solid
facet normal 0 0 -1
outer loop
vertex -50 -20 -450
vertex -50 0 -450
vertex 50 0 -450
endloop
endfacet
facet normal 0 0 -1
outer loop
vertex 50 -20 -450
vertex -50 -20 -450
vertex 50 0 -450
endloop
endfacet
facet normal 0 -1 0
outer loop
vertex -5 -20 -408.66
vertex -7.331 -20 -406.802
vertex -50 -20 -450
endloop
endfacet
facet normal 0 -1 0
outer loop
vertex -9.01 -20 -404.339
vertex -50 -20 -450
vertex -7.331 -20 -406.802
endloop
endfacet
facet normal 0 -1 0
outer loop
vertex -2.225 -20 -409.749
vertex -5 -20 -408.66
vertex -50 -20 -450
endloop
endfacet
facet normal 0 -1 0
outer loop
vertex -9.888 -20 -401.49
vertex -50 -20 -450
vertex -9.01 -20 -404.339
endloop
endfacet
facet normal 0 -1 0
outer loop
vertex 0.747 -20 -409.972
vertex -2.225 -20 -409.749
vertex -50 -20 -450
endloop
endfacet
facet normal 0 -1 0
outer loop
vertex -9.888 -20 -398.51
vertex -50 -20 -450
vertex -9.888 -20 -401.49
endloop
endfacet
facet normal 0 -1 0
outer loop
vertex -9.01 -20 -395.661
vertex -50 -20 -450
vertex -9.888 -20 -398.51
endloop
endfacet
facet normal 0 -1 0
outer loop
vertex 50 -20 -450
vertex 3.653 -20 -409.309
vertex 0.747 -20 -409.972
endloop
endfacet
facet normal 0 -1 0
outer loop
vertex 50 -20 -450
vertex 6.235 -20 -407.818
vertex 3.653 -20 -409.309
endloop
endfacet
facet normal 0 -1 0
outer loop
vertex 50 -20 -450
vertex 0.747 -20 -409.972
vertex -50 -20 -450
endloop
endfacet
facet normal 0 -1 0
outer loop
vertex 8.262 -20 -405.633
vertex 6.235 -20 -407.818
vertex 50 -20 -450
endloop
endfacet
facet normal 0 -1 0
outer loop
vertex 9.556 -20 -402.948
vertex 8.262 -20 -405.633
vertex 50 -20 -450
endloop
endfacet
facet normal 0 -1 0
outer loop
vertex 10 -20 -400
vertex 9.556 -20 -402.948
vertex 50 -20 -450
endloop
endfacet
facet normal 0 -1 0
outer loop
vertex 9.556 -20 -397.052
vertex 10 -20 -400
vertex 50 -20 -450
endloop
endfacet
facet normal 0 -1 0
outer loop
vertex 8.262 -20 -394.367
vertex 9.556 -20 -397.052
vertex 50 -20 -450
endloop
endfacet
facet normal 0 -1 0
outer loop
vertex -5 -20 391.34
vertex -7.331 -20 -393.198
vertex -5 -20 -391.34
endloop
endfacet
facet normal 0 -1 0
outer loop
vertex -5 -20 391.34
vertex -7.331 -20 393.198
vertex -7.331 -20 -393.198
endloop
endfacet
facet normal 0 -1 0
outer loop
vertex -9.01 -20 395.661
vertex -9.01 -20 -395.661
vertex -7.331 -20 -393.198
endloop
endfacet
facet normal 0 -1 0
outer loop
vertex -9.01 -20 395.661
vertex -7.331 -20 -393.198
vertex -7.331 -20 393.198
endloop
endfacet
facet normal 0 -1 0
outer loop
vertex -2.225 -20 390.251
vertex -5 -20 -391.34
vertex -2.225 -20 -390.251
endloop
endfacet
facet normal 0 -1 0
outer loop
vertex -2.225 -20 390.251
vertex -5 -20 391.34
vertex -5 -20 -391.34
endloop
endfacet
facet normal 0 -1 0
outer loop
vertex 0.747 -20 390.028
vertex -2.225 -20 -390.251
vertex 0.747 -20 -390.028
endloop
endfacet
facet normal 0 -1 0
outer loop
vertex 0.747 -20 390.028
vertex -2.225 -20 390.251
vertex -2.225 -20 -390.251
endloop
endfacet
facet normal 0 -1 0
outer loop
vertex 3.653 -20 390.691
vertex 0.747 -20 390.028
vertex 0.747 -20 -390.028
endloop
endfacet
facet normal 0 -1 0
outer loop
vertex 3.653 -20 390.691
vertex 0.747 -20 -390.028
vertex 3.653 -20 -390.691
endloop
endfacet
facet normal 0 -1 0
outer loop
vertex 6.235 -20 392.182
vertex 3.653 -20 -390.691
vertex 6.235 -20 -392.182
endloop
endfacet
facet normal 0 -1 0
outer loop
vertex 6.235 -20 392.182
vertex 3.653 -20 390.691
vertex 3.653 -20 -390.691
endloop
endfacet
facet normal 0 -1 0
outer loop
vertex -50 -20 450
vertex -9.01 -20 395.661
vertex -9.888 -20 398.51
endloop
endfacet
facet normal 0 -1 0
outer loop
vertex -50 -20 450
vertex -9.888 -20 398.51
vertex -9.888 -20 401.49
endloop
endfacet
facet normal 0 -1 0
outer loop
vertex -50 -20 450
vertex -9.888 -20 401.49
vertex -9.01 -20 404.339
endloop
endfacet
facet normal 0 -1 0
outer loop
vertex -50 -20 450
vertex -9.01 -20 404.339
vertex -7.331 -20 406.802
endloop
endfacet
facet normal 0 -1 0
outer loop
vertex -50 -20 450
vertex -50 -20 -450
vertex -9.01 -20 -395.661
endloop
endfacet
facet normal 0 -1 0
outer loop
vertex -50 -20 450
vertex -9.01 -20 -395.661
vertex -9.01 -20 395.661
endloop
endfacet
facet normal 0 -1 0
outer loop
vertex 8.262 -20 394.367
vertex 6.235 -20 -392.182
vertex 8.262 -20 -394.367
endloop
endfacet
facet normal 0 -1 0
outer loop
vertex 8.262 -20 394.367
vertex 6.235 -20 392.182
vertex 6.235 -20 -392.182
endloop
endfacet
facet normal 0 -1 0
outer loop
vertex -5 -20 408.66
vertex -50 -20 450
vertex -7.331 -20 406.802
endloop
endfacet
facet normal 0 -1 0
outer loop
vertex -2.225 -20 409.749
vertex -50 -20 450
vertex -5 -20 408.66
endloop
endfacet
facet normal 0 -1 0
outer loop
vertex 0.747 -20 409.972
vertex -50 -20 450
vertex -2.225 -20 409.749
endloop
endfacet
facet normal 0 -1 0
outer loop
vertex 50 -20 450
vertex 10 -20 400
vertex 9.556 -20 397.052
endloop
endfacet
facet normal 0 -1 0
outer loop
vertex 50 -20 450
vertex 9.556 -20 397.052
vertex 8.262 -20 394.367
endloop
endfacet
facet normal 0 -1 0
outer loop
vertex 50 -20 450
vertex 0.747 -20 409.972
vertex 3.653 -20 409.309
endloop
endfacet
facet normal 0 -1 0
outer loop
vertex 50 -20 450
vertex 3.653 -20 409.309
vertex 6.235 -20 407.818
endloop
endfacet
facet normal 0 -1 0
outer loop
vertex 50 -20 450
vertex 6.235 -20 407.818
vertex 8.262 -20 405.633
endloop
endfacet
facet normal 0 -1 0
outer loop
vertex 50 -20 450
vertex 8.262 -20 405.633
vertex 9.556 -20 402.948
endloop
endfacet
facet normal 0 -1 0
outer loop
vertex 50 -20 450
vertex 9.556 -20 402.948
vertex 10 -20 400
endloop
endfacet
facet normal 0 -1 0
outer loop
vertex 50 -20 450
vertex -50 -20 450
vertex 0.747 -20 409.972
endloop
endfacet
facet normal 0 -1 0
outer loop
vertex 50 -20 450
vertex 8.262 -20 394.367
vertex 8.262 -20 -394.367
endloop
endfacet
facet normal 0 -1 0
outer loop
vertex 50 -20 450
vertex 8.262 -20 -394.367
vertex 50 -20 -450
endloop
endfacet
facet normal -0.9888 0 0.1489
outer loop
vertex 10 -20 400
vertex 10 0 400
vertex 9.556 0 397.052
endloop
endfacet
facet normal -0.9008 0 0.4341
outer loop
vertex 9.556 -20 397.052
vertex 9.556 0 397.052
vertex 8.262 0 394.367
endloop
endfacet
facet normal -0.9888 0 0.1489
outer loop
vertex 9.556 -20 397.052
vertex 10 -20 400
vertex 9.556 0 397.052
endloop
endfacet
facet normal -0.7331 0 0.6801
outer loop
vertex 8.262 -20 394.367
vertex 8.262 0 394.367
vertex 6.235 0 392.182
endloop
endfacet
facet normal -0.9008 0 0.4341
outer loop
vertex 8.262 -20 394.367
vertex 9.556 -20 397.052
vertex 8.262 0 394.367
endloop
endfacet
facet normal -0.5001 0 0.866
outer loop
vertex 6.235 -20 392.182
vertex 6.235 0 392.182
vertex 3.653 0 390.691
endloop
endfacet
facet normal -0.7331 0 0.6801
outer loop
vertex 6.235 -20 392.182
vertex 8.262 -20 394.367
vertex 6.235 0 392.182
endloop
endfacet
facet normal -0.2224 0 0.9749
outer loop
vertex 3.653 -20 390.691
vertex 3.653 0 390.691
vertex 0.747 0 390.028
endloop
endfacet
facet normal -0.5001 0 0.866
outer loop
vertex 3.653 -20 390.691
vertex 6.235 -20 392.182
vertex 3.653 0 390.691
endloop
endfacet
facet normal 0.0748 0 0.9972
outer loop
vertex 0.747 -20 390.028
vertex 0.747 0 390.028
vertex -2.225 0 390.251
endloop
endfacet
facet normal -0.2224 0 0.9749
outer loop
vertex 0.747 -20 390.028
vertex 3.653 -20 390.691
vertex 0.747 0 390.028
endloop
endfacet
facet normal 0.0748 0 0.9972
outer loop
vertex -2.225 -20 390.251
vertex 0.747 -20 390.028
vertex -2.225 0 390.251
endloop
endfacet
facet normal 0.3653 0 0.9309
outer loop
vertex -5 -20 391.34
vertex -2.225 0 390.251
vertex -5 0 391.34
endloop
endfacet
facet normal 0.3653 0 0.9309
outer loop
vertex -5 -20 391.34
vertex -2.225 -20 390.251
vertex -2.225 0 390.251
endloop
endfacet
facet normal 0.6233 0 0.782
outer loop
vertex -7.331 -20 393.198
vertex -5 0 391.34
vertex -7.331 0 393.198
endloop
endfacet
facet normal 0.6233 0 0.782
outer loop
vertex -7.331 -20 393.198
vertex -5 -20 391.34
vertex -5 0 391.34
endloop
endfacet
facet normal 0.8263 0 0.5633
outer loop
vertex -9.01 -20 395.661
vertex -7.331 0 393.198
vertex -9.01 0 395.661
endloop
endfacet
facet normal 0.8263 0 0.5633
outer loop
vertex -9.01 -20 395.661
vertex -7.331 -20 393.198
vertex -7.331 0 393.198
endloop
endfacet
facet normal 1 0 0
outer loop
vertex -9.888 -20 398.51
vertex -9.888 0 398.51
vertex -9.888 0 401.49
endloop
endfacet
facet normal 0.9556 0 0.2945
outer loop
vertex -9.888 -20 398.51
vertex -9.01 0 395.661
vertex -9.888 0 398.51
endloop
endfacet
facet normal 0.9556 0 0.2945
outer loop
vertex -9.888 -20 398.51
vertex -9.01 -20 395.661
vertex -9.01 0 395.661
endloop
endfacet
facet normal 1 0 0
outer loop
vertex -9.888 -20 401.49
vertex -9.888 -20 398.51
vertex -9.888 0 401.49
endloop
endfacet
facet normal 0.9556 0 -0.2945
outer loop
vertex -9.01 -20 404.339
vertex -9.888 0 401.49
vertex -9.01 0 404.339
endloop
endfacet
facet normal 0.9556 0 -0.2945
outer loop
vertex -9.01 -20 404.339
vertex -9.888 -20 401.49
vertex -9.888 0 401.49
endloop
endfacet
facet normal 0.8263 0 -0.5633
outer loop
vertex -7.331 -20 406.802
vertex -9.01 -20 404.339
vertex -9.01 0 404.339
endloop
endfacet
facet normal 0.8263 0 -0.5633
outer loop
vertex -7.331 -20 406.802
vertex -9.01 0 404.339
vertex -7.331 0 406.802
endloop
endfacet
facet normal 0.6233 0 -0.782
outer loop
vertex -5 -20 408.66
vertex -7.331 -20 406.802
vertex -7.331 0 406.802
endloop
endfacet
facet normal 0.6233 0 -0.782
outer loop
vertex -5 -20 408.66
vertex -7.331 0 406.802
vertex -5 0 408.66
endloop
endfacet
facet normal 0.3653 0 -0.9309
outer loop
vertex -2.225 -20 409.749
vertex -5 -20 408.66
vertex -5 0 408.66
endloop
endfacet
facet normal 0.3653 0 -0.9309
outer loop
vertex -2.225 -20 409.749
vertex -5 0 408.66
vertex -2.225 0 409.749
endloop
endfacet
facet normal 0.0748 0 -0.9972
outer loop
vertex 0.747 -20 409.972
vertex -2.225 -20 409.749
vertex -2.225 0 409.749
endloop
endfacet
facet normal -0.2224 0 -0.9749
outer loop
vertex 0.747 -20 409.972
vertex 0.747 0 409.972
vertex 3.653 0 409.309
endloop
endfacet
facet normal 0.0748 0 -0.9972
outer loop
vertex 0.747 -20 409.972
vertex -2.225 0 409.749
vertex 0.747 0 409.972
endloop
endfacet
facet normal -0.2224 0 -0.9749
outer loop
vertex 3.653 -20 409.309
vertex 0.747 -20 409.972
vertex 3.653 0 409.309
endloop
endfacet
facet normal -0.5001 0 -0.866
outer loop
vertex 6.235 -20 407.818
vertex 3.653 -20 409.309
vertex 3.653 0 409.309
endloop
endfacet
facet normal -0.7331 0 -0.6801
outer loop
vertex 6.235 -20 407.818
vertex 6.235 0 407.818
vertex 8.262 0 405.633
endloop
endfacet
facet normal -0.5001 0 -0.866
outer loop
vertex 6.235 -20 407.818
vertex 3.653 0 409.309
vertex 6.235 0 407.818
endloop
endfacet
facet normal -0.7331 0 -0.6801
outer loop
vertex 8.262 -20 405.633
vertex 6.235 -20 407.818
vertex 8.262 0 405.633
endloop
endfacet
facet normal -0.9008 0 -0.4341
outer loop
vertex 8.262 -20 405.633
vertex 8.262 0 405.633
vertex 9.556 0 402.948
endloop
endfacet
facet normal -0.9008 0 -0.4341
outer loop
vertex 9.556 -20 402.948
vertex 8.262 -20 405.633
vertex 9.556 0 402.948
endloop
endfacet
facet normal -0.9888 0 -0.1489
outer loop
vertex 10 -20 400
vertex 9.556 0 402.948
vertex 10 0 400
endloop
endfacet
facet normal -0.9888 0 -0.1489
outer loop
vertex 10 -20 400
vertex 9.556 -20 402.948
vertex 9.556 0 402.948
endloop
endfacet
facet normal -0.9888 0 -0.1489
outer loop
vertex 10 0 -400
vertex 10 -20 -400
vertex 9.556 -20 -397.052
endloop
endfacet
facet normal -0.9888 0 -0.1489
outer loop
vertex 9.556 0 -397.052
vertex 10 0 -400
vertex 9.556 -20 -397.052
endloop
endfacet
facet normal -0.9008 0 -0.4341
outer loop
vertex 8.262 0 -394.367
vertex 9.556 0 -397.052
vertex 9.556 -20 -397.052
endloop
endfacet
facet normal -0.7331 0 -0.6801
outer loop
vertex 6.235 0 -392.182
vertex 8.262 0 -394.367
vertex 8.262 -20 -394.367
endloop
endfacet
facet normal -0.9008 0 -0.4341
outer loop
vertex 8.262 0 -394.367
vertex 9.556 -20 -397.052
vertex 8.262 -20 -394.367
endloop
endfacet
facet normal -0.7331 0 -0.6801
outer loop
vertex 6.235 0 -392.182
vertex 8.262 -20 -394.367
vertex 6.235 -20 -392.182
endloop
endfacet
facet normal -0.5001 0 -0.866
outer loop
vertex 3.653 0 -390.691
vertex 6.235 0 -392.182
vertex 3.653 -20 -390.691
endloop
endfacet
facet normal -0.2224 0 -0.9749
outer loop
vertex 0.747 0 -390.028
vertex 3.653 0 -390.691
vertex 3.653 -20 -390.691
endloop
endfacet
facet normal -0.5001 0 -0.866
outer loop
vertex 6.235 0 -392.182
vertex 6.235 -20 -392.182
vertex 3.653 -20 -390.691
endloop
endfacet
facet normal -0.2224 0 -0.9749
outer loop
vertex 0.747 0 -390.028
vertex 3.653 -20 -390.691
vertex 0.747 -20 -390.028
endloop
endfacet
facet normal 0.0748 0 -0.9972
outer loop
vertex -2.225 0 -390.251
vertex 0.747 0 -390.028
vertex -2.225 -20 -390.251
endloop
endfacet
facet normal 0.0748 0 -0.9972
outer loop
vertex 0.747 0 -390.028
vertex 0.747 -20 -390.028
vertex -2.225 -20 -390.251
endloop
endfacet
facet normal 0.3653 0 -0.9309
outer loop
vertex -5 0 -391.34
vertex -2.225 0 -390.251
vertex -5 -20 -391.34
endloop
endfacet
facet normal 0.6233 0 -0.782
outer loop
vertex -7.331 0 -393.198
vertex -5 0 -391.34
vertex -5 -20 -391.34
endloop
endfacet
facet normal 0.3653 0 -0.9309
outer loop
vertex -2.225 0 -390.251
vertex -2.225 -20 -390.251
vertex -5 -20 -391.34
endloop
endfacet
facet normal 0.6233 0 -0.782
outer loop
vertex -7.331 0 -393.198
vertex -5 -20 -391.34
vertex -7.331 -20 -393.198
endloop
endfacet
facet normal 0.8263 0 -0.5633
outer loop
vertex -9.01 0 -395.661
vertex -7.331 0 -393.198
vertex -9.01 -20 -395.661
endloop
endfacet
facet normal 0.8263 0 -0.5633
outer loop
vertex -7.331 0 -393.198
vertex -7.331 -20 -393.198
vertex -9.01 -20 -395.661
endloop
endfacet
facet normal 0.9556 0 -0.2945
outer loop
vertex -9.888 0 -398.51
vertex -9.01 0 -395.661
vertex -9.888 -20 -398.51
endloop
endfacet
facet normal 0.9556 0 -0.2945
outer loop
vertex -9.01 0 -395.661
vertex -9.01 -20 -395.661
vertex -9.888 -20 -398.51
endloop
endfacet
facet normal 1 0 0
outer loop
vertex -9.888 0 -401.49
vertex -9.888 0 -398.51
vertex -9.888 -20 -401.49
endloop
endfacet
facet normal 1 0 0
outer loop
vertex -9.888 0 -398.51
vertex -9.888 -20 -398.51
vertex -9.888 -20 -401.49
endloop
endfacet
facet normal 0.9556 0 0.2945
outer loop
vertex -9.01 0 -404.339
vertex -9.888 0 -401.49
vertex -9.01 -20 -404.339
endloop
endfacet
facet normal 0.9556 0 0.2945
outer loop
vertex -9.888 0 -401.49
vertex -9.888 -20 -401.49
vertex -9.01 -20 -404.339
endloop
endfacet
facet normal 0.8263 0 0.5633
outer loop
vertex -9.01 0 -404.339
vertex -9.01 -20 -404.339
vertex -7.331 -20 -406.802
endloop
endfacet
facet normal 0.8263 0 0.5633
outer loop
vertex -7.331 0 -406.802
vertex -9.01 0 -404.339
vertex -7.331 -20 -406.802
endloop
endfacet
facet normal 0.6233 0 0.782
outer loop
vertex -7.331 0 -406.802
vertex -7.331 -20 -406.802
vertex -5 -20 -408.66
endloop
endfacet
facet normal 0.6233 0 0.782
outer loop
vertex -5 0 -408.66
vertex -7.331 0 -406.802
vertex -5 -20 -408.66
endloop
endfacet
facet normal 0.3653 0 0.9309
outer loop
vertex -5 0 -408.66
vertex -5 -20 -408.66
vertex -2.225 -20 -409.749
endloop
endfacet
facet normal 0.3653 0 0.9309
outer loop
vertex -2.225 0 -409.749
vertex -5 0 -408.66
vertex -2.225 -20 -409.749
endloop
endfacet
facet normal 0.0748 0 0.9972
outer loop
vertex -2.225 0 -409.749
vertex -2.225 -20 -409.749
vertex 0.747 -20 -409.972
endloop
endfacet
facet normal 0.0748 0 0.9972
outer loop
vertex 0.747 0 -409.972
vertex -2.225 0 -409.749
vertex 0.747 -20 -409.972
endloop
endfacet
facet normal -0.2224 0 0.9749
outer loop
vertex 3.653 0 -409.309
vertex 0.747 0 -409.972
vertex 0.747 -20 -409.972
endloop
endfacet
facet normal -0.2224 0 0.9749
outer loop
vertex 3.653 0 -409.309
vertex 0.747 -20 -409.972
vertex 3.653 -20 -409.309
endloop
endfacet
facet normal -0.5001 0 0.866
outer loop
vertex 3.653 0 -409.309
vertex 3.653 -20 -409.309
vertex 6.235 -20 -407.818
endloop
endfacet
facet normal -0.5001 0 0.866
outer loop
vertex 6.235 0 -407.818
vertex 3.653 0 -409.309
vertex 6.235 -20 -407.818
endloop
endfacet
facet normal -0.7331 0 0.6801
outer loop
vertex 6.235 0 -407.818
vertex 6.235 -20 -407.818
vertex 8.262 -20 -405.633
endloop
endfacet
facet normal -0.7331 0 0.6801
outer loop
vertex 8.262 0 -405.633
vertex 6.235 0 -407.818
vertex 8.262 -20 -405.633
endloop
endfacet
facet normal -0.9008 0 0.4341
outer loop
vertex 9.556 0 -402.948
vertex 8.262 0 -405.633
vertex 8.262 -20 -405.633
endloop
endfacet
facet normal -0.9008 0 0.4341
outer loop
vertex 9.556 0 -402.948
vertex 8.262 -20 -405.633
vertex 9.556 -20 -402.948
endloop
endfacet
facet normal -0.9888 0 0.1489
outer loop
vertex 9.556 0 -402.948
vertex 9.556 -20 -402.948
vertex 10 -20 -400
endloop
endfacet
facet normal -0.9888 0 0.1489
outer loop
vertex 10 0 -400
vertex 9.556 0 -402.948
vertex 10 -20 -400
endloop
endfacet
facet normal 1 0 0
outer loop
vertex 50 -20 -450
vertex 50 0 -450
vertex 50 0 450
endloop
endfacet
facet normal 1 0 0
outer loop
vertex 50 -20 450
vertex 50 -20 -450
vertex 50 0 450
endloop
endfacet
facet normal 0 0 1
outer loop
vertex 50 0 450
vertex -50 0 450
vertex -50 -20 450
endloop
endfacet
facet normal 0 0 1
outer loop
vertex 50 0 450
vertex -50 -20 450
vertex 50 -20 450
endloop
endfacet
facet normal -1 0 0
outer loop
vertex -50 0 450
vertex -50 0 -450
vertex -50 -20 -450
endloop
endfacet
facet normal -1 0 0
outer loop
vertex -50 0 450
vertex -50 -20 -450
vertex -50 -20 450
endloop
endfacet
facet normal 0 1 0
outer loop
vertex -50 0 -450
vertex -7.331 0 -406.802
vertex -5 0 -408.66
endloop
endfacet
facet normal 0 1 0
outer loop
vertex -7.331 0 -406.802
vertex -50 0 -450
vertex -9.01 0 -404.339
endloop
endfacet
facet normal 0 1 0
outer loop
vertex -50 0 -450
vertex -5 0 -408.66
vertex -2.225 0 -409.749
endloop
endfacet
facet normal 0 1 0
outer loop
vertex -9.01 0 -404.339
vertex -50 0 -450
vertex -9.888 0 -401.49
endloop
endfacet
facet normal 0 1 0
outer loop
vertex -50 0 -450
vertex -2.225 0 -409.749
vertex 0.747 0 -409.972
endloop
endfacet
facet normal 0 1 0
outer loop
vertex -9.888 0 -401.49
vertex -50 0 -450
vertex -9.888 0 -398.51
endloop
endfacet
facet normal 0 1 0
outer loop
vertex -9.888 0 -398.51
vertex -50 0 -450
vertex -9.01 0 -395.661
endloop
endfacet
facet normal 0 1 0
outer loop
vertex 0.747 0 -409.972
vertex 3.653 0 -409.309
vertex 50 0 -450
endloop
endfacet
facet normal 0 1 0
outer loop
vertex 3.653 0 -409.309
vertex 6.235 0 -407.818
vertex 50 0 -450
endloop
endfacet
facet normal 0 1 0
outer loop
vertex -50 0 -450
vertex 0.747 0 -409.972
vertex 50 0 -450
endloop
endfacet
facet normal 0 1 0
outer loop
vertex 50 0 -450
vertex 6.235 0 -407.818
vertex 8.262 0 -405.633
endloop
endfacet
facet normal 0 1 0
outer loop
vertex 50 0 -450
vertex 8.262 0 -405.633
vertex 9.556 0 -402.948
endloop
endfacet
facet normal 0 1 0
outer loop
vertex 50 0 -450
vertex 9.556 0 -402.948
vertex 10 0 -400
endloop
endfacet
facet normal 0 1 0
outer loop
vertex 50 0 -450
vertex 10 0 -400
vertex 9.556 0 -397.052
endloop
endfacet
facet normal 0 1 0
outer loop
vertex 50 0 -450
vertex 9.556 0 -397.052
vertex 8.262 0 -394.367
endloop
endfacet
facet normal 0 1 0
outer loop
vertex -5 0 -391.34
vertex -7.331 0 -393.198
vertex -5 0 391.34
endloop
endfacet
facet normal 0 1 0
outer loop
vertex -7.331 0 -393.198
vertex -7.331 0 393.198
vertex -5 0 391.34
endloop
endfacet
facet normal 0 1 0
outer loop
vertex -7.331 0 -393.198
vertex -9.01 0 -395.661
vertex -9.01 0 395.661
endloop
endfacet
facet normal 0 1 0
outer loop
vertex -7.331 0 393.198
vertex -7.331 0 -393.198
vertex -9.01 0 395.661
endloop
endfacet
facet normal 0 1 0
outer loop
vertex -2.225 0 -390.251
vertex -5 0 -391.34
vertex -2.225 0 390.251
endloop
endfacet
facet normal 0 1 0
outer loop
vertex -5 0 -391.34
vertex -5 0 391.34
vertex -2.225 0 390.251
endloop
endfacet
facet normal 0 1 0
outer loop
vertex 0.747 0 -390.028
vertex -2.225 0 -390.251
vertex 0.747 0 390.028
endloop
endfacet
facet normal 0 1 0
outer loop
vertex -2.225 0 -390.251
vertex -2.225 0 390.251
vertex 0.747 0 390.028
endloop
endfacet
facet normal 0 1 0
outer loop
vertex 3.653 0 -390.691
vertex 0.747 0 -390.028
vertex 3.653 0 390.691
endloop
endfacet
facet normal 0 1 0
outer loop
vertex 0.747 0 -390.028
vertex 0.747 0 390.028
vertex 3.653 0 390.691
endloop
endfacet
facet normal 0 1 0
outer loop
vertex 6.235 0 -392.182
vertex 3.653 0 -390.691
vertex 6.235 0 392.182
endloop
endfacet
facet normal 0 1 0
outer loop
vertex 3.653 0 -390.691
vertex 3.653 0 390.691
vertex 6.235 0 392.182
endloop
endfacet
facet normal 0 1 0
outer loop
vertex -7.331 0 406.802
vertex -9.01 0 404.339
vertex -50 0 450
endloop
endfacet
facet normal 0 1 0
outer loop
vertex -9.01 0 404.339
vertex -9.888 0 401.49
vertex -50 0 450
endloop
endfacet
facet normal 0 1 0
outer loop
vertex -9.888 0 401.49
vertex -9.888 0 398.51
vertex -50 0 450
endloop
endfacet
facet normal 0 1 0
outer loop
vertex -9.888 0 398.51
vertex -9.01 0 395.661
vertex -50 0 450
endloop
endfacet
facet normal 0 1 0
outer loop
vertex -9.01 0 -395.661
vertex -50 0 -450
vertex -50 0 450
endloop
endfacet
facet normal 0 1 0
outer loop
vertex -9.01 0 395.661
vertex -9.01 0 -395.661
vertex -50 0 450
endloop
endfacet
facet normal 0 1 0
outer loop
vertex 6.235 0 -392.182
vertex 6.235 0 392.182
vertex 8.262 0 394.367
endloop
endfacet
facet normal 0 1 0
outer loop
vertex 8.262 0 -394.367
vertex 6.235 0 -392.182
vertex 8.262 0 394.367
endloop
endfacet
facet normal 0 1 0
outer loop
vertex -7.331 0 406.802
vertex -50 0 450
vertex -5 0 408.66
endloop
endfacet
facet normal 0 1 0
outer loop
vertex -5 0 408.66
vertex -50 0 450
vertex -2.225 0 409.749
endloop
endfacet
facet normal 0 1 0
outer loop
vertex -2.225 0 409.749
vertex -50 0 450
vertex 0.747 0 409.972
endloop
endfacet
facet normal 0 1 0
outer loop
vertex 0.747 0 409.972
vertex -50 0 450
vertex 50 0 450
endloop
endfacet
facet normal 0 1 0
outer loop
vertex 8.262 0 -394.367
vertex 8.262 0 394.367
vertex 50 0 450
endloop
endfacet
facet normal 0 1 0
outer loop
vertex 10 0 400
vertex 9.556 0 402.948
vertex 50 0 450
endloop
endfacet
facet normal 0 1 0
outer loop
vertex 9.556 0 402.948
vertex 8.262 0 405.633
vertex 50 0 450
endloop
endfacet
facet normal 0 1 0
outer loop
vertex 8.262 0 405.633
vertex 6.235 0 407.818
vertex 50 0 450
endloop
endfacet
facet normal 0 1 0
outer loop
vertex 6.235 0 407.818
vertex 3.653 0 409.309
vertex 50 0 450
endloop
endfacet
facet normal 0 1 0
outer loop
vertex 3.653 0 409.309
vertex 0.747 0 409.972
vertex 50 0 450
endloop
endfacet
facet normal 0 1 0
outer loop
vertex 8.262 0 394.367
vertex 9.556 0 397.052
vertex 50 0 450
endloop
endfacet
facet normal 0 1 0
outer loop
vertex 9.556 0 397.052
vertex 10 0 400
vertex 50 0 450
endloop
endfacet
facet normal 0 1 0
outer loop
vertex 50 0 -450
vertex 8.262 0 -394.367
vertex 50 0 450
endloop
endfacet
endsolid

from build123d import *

# Parameters (mm, degrees)
F0_W     = 100
F0_H     = 900
F1_DEPTH = 20
F2_R     = 10
F3_DEPTH = 25


# Not quite as in the source:
# - a pattern or mirror of a feature is missing from the dataset's text; its kind, count and spacing are read off the source's solid


with BuildPart() as f1:
    # F0 (on Front) → F1 (new body)
    with BuildSketch(Plane.XZ):
        Rectangle(F0_W, F0_H)
    extrude(amount=F1_DEPTH)

    # F2 (on face) → F3 (cut)
    with BuildSketch(Plane.XZ.offset(20)):
        with Locations((0, -400)):
            Circle(F2_R)
    f3 = extrude(amount=-F3_DEPTH, mode=Mode.SUBTRACT)

    # F3_copies: F3 across plane
    add(f3.mirror(Plane.XY), mode=Mode.SUBTRACT)


solid = f1.part
